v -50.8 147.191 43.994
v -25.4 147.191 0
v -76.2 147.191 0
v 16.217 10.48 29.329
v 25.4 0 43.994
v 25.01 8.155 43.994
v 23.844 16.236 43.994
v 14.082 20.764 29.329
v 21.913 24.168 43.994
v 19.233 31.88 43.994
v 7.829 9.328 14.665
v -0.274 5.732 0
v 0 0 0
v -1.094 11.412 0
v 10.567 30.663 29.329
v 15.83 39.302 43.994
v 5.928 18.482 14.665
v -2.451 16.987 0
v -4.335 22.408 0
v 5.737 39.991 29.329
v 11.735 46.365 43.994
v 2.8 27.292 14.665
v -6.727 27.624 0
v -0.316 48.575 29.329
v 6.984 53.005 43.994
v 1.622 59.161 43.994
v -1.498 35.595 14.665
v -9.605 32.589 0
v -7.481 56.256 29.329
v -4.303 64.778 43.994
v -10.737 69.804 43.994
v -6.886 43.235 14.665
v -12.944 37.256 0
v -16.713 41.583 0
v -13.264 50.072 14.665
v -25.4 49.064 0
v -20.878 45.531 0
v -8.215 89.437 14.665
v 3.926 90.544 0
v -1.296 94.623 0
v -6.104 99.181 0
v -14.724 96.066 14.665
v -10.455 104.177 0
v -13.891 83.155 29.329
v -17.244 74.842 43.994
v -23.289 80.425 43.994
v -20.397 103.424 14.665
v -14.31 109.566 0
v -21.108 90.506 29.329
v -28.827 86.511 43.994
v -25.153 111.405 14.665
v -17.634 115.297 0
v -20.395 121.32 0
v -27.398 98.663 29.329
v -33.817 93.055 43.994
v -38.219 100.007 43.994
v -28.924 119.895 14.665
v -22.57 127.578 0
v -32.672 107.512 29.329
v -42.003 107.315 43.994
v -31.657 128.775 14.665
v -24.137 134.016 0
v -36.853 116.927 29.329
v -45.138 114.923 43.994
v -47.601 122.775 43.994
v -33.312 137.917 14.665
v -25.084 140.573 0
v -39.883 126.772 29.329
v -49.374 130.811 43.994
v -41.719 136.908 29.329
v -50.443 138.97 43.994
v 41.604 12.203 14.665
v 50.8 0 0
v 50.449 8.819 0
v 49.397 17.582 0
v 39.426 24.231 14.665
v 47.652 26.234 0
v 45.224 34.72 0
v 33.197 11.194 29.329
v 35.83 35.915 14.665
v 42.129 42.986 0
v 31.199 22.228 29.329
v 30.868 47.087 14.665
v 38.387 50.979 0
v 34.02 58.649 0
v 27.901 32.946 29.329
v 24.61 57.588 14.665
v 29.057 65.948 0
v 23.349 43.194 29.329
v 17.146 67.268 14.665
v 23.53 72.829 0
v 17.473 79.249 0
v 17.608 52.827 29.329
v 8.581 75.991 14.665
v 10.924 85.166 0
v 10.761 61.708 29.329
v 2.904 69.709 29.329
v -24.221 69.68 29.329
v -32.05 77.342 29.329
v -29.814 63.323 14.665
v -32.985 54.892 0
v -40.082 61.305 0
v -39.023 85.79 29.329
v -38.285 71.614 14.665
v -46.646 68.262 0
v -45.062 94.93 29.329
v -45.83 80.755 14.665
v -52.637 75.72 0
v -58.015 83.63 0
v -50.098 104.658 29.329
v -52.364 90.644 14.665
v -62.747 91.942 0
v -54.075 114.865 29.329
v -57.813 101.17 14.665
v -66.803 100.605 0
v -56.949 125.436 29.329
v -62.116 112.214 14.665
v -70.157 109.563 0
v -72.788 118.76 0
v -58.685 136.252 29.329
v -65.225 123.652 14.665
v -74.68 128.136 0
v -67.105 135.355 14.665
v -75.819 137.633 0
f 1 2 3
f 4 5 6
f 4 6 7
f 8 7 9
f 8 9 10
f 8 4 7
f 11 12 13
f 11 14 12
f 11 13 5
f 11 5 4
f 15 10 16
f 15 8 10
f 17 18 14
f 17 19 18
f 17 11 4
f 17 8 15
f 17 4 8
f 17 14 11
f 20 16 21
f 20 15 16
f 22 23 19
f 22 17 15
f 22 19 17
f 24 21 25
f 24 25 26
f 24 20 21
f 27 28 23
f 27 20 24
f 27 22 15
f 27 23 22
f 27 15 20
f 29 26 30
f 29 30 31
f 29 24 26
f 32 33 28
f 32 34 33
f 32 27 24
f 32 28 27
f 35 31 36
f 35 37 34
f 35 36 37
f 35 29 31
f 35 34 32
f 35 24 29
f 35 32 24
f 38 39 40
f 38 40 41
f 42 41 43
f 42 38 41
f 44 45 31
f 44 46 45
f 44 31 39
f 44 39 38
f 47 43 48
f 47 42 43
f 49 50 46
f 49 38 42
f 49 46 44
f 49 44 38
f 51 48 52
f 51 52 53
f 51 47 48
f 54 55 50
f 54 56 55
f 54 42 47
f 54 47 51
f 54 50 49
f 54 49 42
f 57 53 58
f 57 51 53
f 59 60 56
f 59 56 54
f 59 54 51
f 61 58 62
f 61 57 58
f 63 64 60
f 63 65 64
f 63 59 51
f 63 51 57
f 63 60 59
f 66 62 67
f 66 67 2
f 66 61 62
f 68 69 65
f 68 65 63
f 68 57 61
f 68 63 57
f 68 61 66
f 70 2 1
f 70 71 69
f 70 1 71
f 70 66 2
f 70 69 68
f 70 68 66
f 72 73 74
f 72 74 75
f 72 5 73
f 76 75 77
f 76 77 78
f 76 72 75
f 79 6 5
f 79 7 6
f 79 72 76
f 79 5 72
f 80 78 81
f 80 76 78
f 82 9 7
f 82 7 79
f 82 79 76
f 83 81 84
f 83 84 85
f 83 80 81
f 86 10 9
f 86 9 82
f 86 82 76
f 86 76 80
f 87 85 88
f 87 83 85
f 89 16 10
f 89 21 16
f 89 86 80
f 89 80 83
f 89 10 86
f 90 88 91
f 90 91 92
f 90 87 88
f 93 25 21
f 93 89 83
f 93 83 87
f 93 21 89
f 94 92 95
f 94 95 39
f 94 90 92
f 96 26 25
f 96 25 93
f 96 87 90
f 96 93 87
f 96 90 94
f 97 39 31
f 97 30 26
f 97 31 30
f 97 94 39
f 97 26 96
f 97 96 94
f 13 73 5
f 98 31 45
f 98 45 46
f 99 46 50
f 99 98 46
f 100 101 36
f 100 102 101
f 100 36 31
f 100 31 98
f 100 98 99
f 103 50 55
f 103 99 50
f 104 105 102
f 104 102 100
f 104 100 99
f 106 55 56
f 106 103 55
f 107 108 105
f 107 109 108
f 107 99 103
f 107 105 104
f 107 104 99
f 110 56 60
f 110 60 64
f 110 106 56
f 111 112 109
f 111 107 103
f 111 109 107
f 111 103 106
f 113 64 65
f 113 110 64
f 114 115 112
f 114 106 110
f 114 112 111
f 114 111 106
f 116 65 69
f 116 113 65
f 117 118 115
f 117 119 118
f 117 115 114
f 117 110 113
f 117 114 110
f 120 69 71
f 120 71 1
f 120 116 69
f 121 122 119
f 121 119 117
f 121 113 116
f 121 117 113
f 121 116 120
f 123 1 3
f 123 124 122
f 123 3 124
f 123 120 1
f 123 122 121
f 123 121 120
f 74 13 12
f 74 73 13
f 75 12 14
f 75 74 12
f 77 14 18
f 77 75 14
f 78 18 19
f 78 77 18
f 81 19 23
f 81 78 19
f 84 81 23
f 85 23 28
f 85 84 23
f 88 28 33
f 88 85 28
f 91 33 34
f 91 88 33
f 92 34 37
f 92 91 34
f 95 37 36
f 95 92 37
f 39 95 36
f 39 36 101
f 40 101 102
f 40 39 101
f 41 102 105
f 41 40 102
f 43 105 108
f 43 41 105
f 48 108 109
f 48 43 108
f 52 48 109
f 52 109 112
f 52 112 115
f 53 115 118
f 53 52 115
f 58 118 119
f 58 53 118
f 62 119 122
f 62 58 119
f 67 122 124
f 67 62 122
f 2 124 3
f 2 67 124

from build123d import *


with BuildPart() as f2:
    # F2: sweep along a path in F0
    with BuildLine(Plane.XY) as f2_path:
        ThreePointArc((0, 0), (-6.726505, 27.624275), (-25.4, 49.063656))
        ThreePointArc((-25.4, 49.063656), (-62.74699, 91.942418), (-76.2, 147.190969))
    # F1 (on Front) → F2 (sweep)
    with BuildSketch(Plane.XZ):
        Polygon((0, 0), (50.8, 0), (25.4, 43.994091), align=None)
    sweep(path=f2_path.line)


solid = f2.part
